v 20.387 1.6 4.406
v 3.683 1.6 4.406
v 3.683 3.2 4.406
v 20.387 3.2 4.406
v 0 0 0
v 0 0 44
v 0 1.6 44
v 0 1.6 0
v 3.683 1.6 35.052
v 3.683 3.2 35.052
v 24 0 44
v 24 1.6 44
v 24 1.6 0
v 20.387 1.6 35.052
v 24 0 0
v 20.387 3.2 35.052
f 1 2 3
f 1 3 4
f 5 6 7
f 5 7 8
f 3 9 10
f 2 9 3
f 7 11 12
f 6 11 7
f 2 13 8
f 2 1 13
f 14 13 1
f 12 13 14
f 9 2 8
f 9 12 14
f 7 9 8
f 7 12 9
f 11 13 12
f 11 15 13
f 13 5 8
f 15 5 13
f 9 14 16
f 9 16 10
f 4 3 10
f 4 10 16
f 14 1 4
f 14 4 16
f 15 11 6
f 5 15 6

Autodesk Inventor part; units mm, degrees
ref_plane "YZ Plane" through (0, 0, 0) normal (1, 0, 0) x (0, 1, 0)
ref_plane "XZ Plane" through (0, 0, 0) normal (0, 1, 0) x (-1, 0, 0)
ref_plane "XY Plane" through (0, 0, 0) normal (0, 0, 1) x (1, 0, 0)
sketch "Sketch1" plane through (0, 0, 0) normal (0, 1, 0) x (-1, 0, 0)
  line L0 (0, 0) -> (-24, 0)
  line L1 (-24, 0) -> (-24, 44)
  line L2 (-24, 44) -> (0, 44)
  line L3 (0, 44) -> (0, 0)
  dimension "d0" = 24
  dimension "d1" = 44
extrude "Extrusion1" add sketch "Sketch1" along normal blind 1.6
sketch "Sketch3" plane through (0, 1.6, 0) normal (0, 1, 0) x (1, 0, 0)
  line L0 (3.6828, -4.4062) -> (20.3867, -4.4062)
  line L1 (20.3867, -4.4062) -> (20.3867, -35.052)
  line L2 (20.3867, -35.052) -> (3.6828, -35.052)
  line L3 (3.6828, -35.052) -> (3.6828, -4.4062)
  line L4 (4.8665, -37.9456) -> (18.6769, -37.9456)
  line L5 (18.6769, -37.9456) -> (18.6769, -41.7599)
  line L6 (18.6769, -41.7599) -> (4.8665, -41.7599)
  line L7 (4.8665, -41.7599) -> (4.8665, -37.9456)
  point P0 (0, 0)
extrude "Extrusion3" add sketch "Sketch3" along normal blind 1.6 contours L0 L1 L2 L3
sketch "Sketch4" plane through (0, 1.6, 0) normal (0, 1, 0) x (1, 0, 0)
  point P0 (0, 0)
properties part number "Gyro"
